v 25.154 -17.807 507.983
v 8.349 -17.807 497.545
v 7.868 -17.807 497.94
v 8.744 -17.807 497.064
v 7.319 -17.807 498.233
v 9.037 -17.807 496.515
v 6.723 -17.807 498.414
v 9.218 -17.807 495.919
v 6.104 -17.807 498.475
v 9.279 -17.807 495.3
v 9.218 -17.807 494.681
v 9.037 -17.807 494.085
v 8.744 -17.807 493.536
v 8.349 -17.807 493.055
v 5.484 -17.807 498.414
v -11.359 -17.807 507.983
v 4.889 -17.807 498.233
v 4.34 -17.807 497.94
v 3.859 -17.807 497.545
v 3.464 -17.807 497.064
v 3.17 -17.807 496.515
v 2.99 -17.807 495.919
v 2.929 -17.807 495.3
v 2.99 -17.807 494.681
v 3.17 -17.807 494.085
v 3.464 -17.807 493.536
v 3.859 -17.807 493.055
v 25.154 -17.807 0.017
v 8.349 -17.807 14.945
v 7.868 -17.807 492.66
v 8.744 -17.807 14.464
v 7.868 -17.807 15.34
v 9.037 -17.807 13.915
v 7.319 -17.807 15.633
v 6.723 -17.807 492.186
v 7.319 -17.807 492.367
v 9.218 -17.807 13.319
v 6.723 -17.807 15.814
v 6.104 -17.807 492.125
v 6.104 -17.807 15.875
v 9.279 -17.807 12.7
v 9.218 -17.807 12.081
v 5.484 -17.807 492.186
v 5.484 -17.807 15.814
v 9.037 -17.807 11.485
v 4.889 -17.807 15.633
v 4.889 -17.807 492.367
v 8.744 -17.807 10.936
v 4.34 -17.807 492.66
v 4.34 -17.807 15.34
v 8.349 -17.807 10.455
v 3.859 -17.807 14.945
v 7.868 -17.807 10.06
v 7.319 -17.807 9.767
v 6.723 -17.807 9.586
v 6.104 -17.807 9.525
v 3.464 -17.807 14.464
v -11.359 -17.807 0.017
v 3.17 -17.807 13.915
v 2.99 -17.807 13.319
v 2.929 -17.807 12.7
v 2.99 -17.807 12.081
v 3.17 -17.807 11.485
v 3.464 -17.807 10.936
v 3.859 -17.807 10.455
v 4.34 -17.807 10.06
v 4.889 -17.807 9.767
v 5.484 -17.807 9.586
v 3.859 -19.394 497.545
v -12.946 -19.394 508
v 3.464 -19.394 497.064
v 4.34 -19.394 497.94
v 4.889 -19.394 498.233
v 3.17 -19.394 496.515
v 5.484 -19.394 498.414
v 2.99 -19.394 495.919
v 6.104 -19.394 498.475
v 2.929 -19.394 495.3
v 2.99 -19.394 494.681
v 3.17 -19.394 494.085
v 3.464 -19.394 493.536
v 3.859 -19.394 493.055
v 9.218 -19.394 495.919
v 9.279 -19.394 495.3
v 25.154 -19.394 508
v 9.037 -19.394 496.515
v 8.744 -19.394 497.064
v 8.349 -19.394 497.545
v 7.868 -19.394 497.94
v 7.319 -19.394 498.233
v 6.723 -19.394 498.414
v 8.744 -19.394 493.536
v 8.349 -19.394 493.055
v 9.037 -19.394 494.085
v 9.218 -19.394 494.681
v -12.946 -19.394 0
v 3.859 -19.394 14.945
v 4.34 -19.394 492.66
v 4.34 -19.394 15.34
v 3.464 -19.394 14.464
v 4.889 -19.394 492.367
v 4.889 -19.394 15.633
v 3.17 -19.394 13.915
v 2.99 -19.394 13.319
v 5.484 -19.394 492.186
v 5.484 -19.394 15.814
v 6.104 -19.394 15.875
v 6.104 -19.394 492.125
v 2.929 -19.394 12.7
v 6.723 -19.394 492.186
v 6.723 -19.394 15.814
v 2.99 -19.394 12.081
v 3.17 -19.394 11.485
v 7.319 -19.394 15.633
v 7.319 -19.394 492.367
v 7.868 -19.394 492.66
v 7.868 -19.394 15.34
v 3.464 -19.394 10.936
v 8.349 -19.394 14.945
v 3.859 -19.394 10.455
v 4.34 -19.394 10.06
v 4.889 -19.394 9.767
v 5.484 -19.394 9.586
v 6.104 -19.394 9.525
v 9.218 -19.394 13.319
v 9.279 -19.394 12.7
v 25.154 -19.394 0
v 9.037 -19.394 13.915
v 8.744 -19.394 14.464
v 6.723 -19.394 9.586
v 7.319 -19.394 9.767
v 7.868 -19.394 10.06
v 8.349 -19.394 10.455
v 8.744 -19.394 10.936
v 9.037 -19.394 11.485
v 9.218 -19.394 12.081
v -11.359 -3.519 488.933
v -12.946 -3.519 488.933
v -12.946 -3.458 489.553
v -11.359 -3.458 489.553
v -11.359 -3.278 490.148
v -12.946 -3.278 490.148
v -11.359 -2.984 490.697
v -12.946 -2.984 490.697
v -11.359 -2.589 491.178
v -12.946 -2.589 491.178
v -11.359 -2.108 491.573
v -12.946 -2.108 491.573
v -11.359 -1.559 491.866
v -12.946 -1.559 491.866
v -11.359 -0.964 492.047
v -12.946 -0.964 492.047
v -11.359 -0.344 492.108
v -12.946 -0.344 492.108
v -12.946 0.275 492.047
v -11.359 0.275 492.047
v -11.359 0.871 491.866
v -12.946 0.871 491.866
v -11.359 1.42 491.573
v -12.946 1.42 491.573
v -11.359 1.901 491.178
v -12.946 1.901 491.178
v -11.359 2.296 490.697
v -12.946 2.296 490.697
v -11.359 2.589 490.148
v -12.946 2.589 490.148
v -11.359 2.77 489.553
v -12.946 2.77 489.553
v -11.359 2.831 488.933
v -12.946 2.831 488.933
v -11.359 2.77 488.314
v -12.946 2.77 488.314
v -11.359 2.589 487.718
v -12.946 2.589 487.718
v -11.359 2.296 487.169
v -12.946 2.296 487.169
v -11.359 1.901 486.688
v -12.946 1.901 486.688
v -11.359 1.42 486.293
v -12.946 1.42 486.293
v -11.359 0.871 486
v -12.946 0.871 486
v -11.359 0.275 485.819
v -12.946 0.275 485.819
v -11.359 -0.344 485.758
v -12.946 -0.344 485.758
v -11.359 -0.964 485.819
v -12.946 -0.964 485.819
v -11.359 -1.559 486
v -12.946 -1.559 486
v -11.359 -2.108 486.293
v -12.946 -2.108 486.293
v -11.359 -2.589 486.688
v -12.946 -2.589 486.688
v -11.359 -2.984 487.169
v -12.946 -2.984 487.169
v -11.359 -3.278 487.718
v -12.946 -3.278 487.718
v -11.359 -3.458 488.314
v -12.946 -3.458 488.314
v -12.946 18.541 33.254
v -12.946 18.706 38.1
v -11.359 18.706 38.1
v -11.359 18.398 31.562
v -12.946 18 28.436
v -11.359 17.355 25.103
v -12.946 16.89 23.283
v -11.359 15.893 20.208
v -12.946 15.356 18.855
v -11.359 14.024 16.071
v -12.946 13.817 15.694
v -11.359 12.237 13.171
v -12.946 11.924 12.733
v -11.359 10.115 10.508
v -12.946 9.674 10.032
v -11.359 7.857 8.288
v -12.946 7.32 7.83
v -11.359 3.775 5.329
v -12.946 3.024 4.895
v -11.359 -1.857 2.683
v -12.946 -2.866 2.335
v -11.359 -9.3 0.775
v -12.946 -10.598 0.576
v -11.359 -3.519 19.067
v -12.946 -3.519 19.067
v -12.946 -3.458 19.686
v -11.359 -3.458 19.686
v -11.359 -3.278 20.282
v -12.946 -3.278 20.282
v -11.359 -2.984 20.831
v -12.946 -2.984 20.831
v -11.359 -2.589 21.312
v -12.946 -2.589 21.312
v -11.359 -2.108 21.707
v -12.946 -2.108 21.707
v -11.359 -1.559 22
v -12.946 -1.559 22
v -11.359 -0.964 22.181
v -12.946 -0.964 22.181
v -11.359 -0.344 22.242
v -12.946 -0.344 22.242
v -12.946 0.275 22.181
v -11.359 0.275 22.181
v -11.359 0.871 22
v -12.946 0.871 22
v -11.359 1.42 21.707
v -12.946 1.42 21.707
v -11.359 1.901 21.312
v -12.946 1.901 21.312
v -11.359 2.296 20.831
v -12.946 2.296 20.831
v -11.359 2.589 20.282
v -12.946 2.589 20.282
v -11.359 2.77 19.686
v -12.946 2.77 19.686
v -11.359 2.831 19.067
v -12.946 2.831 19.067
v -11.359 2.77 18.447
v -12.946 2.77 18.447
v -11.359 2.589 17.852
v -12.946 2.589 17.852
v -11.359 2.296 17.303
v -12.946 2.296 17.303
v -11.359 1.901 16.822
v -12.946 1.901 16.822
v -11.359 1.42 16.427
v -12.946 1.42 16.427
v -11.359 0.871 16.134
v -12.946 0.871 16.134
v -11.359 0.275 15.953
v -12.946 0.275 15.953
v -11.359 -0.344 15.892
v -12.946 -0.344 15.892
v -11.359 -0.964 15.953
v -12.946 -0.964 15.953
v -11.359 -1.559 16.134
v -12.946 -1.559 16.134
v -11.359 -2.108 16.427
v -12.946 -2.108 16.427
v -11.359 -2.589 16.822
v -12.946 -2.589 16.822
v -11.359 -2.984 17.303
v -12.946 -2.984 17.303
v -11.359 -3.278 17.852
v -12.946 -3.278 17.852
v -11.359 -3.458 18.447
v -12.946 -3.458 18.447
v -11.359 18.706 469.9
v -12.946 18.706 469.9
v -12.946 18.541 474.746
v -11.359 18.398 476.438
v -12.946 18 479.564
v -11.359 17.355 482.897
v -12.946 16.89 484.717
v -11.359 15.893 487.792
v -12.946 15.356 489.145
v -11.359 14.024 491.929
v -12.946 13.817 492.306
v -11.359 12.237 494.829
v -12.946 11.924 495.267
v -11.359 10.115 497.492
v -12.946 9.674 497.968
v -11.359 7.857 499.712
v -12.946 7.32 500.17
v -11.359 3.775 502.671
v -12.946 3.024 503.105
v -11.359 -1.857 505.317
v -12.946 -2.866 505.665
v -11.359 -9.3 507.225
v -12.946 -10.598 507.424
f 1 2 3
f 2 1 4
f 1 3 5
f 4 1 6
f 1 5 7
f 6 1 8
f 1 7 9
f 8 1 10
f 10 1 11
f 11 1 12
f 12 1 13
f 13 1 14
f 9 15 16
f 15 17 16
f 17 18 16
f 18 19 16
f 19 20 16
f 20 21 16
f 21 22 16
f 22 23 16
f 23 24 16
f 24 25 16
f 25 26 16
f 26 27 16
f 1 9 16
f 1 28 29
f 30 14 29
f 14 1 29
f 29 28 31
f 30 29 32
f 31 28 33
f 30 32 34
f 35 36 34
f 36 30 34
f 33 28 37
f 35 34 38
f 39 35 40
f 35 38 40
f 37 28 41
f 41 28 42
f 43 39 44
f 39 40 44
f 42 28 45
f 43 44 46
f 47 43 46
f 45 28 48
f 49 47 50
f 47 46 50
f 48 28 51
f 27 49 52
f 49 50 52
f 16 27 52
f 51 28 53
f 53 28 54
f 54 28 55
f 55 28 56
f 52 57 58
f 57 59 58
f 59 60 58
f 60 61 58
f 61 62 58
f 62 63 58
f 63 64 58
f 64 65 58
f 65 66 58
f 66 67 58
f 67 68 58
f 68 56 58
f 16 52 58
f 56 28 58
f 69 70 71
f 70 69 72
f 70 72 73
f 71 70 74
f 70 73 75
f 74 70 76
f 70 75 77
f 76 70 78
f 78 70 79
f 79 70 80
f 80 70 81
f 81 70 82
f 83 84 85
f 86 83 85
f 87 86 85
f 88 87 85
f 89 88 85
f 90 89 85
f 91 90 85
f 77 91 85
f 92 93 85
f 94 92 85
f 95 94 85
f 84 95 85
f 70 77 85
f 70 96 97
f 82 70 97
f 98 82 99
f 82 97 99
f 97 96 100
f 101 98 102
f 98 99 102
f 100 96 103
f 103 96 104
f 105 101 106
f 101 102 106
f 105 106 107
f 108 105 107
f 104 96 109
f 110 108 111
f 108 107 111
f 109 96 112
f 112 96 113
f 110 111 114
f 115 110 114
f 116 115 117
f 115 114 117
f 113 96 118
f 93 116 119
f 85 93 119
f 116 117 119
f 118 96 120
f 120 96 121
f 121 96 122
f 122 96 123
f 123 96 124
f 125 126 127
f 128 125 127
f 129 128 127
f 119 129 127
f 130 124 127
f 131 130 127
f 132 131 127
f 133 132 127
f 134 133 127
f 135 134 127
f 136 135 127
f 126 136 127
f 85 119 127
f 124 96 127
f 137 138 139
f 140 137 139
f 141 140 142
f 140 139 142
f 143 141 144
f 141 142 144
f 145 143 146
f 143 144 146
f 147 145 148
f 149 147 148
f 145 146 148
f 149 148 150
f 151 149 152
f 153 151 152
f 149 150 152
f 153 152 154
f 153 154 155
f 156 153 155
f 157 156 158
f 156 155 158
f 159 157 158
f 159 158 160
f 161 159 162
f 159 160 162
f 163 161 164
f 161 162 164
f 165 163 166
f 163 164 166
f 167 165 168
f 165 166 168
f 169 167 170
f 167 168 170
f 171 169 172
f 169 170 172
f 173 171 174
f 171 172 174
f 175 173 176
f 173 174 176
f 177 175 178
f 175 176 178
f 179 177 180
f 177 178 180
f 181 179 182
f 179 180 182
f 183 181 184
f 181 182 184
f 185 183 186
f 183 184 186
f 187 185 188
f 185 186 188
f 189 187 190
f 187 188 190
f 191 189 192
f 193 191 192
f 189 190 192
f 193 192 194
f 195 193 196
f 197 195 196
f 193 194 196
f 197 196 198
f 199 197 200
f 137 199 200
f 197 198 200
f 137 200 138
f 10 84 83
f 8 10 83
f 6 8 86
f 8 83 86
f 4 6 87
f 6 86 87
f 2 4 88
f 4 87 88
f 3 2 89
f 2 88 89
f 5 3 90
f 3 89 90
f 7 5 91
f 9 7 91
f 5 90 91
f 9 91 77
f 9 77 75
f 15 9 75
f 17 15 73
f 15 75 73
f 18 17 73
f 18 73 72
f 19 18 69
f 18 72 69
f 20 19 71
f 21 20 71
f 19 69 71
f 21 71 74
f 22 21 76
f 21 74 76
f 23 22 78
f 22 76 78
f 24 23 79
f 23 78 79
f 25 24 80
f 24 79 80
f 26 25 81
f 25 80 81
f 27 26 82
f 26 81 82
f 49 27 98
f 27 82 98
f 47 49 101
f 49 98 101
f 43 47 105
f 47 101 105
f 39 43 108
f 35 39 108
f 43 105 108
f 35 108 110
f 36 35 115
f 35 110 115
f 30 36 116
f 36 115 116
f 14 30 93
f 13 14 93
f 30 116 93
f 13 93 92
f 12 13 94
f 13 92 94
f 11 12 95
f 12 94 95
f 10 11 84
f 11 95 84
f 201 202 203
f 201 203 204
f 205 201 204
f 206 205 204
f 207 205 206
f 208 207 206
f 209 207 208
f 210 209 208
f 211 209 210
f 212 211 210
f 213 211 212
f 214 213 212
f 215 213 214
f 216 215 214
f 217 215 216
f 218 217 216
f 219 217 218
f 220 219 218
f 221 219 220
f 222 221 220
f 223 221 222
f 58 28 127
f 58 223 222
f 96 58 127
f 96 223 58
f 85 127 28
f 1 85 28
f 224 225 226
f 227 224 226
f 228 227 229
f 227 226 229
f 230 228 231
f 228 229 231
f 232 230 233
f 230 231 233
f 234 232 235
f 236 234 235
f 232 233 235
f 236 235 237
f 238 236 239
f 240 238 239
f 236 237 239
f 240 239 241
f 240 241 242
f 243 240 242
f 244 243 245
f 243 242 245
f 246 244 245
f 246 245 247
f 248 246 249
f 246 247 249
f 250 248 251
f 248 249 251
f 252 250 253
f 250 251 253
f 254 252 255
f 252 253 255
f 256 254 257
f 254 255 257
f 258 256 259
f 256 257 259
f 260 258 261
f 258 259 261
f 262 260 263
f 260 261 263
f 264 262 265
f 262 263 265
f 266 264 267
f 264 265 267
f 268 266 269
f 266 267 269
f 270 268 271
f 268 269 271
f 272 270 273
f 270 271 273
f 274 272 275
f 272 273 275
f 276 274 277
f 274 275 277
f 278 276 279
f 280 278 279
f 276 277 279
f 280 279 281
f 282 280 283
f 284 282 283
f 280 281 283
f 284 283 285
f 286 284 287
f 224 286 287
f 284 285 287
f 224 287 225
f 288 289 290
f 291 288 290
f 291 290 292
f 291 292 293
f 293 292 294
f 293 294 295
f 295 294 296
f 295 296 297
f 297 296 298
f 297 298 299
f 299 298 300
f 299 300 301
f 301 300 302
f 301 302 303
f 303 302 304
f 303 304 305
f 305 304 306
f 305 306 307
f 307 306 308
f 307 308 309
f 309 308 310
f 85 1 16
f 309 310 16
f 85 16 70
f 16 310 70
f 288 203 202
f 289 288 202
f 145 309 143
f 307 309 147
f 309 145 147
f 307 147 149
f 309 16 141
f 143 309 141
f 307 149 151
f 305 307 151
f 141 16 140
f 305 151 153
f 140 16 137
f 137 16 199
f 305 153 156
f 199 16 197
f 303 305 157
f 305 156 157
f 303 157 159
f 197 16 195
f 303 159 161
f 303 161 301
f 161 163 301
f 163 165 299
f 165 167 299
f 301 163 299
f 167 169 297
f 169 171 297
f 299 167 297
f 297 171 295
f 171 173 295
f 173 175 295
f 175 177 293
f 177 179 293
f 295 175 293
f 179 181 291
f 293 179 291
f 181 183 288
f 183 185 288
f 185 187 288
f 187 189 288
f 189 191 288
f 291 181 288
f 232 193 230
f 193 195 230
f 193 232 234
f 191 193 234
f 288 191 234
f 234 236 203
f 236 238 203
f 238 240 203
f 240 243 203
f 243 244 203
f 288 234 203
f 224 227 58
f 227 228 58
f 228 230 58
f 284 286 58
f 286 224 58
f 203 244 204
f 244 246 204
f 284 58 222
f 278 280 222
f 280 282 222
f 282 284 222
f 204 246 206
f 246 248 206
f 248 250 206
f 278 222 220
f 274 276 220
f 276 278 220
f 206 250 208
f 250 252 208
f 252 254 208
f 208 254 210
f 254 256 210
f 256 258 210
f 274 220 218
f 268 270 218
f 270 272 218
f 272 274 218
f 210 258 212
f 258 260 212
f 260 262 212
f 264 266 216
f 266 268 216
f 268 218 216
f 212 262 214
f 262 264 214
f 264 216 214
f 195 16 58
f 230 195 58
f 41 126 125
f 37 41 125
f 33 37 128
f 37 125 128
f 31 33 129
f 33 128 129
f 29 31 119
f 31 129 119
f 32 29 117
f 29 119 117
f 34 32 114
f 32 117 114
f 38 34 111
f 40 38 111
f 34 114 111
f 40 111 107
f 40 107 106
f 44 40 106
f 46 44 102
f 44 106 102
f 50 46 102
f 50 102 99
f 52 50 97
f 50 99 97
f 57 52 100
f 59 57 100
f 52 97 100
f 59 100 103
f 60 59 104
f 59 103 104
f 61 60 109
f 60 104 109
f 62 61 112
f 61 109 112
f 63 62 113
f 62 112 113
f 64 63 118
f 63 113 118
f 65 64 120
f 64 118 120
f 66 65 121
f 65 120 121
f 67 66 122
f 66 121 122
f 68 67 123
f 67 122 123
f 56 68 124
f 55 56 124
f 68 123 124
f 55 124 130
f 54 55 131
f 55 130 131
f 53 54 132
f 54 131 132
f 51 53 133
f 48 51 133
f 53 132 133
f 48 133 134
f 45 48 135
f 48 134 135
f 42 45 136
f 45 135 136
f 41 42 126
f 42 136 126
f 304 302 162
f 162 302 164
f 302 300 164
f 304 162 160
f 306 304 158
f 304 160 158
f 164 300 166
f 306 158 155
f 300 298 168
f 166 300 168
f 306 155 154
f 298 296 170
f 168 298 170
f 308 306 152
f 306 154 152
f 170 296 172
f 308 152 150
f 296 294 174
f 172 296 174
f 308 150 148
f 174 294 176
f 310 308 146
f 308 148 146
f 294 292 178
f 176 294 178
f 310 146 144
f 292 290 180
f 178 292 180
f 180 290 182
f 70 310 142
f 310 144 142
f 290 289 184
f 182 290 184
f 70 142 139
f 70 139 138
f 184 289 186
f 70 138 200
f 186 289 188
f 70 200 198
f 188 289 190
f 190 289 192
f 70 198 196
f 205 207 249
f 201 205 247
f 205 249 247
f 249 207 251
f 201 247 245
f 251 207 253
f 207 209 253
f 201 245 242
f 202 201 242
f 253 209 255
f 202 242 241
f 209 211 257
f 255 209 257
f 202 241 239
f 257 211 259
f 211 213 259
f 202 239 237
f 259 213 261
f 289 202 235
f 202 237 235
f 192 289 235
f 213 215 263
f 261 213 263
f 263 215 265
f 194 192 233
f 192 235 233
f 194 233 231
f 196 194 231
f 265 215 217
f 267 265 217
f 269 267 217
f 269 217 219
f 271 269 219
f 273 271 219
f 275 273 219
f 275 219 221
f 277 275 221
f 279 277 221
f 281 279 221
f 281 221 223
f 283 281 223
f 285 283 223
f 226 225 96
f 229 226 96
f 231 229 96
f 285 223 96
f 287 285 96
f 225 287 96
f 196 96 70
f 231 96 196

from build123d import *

# Parameters (mm, degrees)
F1_DEPTH    = 508
F2_T1_DEPTH = 192.0875
F3_R        = 3.175
F4_DEPTH    = 1.5875
F5_R        = 3.175
F6_DEPTH    = 1.5875


# Not quite as in the source:
# - a fillet or chamfer that OpenCascade refuses, or shapes differently, is made with other operations: its cross-section is extruded or revolved along the edge and cut away or added


with BuildPart() as f1:
    # F0 (on Top) → F1 (new body)
    with BuildSketch(Plane.XY):
        Polygon((-11.3587090754, 18.7056229889), (-12.9462090754, 18.7056229889), (-12.9462090754, -19.3943770111), (25.1537909246, -19.3943770111), (25.1537909246, -17.8068770111), (-11.3587090754, -17.8068770111), align=None)
    extrude(amount=F1_DEPTH)

    # F2: fillet of radius 38.1 on 2 edges, made by hand

    # F2_s2 → F2_t1 (cut)
    with BuildSketch(Plane.YZ.offset(-108.1962090754)):
        with BuildLine():
            add(Edge.make_bspline(
                [(18.7056229889, 469.9), (18.7056229889, 508), (-19.3943770111, 508)],
                knots=[0, 0, 0, 1, 1, 1], degree=2, weights=[1, 1, 1]))
            Line((-19.3943770111, 508), (18.7056229889, 508))
            Line((18.7056229889, 508), (18.7056229889, 469.9))
        make_face()
        with BuildLine():
            add(Edge.make_bspline(
                [(18.7056229889, 38.1), (18.7056229889, 0), (-19.3943770111, 0)],
                knots=[0, 0, 0, 1, 1, 1], degree=2, weights=[1, 1, 1]))
            Line((-19.3943770111, 0), (18.7056229889, 0))
            Line((18.7056229889, 0), (18.7056229889, 38.1))
        make_face()
    extrude(amount=F2_T1_DEPTH, mode=Mode.SUBTRACT)

    # F3 (on face) → F4 (cut)
    with BuildSketch(Plane(origin=(-12.9462090754, 0, 0), x_dir=(0, -1, 0), z_dir=(-1, 0, 0))):
        with Locations((0.3443770111, 488.9331097904)):
            Circle(F3_R)
        with Locations((0.3443770111, 19.0668902096)):
            Circle(F3_R)
    extrude(amount=-F4_DEPTH, mode=Mode.SUBTRACT)

    # F5 (on face) → F6 (cut)
    with BuildSketch(Plane.XZ.offset(19.3943770111)):
        with Locations((6.1037909246, 12.7)):
            Circle(F5_R)
        with Locations((6.1037909246, 495.3)):
            Circle(F5_R)
    extrude(amount=-F6_DEPTH, mode=Mode.SUBTRACT)


solid = f1.part
